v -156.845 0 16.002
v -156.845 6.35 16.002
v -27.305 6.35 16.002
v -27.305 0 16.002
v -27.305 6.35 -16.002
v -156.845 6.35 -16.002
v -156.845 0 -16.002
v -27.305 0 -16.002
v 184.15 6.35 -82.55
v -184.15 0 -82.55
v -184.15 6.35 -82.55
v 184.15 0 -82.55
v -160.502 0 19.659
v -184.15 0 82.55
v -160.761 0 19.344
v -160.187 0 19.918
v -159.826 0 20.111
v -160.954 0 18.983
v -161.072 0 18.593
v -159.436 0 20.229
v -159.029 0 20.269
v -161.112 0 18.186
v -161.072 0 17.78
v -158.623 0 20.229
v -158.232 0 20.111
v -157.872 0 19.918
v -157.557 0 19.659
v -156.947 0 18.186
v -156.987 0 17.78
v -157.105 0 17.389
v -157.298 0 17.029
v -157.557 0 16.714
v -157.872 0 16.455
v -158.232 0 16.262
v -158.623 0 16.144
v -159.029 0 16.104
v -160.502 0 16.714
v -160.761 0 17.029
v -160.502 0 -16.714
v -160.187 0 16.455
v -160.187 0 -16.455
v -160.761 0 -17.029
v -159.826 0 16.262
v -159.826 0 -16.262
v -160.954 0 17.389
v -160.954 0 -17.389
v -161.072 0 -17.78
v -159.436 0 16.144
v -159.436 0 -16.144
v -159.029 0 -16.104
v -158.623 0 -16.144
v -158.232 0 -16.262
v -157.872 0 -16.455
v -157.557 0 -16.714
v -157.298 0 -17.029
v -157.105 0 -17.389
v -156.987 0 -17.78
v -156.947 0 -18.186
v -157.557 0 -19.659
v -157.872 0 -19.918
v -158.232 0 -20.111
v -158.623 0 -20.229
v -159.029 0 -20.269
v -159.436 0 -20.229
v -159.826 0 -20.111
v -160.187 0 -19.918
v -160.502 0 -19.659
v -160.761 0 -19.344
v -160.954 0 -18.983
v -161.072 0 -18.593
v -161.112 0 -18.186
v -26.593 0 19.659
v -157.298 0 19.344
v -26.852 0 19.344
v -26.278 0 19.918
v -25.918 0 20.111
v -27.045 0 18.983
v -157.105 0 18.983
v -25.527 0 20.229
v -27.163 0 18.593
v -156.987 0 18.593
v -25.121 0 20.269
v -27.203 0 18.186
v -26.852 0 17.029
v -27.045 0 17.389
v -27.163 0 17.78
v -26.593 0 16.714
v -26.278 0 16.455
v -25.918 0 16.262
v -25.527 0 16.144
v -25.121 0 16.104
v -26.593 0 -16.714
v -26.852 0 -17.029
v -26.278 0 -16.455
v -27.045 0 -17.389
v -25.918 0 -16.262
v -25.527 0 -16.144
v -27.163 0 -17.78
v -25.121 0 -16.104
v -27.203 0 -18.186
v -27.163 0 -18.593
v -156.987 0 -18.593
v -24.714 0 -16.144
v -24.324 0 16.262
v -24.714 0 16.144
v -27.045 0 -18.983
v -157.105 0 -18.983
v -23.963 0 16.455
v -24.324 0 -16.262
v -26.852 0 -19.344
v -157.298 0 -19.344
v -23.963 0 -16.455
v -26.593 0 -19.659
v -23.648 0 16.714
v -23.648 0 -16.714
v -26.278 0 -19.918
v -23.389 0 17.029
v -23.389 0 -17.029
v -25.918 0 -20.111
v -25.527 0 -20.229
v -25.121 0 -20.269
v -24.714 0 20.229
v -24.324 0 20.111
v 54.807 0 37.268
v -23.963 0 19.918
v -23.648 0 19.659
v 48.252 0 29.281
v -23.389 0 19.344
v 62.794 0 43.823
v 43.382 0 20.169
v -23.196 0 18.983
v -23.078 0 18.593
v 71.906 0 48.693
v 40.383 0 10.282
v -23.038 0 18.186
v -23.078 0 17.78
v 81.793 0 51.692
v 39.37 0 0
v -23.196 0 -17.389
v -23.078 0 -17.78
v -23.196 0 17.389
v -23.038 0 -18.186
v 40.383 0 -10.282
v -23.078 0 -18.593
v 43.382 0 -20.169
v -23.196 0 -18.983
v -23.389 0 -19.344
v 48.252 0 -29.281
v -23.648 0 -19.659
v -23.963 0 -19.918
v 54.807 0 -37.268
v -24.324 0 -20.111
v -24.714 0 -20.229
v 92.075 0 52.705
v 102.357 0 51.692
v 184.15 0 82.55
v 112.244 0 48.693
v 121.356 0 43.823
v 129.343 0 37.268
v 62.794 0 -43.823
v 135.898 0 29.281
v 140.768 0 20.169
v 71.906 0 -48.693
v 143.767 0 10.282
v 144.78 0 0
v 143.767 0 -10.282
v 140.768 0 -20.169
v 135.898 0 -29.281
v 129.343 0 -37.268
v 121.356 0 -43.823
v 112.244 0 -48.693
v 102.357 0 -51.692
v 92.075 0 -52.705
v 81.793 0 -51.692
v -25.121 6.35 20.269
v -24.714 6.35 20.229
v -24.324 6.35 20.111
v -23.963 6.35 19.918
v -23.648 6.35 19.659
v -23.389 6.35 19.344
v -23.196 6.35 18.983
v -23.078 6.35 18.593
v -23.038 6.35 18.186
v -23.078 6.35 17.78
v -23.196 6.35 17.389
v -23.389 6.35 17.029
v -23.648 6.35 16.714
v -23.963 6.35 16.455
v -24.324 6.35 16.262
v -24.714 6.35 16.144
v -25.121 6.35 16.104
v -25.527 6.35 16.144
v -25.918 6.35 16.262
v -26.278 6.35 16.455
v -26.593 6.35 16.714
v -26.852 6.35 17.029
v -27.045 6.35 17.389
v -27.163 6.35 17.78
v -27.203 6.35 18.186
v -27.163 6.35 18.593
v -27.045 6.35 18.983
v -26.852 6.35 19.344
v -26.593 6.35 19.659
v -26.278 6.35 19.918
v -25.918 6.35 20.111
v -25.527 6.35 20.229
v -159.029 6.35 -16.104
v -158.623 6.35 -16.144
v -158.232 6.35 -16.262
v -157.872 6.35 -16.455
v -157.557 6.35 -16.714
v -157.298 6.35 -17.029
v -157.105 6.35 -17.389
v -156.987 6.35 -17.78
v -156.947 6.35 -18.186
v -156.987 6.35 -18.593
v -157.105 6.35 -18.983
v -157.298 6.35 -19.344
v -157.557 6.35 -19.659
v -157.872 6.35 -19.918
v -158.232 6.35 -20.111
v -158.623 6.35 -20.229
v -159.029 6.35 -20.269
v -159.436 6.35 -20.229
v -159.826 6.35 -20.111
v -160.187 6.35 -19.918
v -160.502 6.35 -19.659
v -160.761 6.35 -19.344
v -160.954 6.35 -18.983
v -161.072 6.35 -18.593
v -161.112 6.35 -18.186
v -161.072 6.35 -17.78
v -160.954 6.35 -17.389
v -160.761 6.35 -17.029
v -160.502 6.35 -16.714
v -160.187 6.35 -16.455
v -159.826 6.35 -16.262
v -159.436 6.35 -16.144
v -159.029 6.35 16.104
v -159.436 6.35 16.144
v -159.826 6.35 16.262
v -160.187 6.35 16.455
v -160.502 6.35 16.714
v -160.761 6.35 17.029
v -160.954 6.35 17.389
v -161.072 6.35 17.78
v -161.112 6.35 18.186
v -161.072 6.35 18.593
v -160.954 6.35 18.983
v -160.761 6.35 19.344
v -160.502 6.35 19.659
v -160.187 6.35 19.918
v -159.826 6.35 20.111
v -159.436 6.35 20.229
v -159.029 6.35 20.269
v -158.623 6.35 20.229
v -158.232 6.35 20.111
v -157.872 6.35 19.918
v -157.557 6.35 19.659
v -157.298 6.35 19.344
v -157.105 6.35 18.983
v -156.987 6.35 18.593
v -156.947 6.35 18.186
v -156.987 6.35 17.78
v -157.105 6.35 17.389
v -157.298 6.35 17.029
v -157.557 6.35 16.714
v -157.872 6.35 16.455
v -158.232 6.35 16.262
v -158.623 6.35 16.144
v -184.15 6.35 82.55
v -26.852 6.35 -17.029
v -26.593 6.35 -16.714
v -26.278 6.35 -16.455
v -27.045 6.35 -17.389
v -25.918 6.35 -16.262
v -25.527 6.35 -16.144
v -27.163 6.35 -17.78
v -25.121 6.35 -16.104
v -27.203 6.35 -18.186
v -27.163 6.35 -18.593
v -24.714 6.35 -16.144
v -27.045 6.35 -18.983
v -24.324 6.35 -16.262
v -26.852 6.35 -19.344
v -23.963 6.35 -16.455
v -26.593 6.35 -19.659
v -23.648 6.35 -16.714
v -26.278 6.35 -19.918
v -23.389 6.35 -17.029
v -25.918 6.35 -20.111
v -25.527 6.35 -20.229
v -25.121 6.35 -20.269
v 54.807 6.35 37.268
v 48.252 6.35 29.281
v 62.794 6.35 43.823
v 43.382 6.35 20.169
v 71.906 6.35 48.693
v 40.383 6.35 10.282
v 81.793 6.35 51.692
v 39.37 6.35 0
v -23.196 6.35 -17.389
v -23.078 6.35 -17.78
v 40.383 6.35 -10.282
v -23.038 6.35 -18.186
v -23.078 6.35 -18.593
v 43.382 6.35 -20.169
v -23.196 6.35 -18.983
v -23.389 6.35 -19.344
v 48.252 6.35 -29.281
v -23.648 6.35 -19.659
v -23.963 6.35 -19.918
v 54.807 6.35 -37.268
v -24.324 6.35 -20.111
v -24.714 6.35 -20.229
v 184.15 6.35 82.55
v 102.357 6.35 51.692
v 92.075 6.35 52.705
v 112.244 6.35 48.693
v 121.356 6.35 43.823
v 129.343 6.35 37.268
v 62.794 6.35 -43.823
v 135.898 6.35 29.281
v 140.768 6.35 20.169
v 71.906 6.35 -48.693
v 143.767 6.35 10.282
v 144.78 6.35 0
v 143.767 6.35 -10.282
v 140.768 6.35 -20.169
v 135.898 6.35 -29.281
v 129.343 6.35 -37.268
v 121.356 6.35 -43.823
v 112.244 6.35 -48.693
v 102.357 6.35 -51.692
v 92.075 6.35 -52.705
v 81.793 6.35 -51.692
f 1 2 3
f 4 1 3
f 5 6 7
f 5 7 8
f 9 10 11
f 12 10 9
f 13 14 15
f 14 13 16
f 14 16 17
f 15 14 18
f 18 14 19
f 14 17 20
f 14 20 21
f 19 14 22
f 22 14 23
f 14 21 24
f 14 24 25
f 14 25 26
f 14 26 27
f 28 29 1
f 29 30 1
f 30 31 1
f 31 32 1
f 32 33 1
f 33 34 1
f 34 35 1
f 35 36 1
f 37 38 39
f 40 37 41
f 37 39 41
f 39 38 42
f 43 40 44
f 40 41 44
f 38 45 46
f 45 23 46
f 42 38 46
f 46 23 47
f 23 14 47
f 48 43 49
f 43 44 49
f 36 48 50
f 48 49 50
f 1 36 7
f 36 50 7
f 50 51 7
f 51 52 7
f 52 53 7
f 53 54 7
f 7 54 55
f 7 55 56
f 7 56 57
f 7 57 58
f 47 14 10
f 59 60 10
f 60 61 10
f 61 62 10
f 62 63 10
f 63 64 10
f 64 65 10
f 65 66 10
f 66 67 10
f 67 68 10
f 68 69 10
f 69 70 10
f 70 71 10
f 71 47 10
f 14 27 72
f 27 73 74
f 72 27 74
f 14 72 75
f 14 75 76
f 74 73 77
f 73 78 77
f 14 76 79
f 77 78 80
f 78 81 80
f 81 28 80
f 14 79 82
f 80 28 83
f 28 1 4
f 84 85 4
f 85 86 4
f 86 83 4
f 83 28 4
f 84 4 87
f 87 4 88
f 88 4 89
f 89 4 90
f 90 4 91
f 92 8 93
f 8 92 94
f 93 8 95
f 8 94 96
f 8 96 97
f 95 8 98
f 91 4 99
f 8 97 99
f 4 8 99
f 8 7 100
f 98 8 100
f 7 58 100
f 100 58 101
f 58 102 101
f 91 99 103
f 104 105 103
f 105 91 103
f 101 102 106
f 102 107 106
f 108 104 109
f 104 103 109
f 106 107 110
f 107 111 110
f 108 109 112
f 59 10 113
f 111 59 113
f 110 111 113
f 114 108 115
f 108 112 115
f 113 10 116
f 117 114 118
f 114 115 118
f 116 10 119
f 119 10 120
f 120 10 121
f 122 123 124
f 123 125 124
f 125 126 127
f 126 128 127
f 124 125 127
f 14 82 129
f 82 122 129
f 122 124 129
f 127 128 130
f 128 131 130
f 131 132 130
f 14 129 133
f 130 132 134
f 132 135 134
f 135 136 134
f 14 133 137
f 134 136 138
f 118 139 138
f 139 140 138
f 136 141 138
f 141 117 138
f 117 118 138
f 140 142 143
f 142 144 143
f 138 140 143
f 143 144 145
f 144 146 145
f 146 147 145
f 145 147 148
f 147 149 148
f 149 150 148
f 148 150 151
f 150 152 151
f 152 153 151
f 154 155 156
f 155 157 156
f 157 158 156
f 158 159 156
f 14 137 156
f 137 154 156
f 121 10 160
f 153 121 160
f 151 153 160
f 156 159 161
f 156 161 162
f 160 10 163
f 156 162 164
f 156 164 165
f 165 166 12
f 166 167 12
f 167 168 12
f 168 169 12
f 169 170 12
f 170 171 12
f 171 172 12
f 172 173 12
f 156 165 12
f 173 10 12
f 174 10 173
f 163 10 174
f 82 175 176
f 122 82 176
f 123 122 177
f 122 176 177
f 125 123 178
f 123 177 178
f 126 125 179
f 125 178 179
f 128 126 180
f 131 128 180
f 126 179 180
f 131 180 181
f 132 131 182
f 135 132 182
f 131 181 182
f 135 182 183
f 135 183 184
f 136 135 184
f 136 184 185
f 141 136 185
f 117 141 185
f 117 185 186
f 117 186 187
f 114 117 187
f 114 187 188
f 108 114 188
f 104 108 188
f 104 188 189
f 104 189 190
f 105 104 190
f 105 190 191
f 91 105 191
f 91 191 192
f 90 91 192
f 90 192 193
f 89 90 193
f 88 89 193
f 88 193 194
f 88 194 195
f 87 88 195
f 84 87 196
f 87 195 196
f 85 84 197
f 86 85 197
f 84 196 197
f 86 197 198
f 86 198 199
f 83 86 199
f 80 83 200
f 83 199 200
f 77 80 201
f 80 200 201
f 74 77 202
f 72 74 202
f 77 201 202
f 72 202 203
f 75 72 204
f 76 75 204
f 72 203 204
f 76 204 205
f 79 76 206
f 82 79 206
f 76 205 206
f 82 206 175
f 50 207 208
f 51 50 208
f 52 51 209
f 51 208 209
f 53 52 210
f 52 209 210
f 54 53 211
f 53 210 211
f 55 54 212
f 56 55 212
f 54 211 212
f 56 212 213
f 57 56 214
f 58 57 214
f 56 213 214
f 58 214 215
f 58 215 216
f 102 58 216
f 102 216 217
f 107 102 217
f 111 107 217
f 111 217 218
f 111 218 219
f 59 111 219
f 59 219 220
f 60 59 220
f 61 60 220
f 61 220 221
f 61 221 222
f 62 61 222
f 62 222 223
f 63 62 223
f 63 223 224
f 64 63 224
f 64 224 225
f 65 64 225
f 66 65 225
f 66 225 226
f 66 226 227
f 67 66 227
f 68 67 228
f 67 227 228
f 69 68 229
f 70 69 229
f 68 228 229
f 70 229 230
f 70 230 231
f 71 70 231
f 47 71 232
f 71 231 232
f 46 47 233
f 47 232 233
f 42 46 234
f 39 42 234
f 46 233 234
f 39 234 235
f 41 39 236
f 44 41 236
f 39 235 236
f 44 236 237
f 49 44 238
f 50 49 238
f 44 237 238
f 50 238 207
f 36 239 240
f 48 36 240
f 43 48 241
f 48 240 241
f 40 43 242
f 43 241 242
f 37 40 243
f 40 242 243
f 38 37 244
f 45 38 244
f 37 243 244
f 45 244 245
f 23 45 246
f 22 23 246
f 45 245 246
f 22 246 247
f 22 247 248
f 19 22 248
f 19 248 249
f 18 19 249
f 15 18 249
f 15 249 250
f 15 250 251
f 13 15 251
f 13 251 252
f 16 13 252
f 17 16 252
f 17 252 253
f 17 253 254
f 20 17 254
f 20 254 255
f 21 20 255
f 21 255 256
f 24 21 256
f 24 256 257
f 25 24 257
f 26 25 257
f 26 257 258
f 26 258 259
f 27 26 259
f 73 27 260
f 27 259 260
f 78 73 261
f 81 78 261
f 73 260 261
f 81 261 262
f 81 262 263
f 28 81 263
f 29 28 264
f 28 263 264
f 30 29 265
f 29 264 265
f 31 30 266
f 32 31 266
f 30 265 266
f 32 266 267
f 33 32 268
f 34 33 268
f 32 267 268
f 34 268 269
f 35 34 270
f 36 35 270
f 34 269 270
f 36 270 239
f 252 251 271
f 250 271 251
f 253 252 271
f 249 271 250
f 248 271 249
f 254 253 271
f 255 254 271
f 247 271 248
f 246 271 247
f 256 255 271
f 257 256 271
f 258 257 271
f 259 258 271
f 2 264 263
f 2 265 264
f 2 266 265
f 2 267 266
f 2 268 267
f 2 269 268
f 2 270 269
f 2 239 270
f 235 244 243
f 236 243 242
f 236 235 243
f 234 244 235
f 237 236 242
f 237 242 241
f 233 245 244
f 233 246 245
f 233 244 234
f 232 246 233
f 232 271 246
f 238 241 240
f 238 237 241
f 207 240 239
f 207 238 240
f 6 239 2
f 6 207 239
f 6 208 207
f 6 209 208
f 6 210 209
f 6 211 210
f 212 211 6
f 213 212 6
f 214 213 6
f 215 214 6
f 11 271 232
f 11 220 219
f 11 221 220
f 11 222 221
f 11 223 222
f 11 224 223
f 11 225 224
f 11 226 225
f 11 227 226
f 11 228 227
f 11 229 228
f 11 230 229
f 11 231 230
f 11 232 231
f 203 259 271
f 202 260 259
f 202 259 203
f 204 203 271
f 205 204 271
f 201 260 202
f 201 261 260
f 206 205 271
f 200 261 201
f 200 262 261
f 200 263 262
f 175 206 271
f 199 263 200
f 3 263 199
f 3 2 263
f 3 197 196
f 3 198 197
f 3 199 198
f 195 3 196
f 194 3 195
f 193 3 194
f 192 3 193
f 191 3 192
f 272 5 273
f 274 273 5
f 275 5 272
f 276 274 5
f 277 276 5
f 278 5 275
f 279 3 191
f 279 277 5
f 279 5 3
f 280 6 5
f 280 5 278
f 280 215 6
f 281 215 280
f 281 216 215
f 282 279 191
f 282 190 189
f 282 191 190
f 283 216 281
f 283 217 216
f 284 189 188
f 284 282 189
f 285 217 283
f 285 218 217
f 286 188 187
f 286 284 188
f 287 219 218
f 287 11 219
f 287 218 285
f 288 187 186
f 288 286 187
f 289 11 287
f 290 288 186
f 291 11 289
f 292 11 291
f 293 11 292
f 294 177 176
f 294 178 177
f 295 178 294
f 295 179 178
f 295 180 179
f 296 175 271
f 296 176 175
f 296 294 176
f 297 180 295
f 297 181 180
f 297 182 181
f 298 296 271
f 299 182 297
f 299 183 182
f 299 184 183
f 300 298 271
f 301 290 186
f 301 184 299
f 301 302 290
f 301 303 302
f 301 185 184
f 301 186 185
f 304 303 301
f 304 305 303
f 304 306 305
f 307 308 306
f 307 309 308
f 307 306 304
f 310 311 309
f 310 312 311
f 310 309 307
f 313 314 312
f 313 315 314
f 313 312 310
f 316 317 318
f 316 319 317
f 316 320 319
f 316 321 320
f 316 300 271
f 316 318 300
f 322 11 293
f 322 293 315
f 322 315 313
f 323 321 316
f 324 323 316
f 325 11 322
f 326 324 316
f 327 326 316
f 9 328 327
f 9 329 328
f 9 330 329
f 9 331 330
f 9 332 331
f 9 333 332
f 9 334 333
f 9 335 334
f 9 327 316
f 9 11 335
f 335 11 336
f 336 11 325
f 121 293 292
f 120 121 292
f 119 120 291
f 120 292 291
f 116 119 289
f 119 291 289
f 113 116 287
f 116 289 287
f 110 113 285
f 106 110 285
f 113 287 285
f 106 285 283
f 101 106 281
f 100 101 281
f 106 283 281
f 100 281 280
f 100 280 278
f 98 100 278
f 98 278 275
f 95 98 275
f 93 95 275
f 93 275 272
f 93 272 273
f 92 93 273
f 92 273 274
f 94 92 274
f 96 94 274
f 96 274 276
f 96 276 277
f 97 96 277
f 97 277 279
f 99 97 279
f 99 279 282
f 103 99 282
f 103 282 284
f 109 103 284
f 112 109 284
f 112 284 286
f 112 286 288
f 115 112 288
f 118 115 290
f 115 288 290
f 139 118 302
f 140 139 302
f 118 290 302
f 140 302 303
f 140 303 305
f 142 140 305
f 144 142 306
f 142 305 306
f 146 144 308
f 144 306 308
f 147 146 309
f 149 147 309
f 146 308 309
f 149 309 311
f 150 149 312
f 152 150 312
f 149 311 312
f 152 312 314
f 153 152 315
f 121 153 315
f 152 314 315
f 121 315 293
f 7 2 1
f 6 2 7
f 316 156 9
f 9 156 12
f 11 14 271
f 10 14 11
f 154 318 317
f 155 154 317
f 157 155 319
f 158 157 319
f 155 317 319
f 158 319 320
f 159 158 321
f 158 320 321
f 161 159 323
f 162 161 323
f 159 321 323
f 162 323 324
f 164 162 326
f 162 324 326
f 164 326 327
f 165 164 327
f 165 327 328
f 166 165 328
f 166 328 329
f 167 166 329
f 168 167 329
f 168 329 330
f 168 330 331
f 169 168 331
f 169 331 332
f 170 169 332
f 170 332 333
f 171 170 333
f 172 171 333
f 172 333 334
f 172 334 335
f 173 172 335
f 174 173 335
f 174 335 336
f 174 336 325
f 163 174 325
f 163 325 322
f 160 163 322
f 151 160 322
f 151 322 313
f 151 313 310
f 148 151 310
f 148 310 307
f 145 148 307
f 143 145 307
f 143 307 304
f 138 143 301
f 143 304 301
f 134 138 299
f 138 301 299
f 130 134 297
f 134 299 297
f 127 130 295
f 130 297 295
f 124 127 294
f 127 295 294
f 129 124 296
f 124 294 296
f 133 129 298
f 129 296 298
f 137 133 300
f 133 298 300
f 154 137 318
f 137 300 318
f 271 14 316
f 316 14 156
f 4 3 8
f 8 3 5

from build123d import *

# Parameters (mm, degrees)
SKETCH1_W           = 368.3
SKETCH1_H           = 165.1
BOSS_EXTRUDE1_DEPTH = 6.35
SKETCH2_R           = 52.705
SKETCH2_R_2         = 2.0828
SKETCH2_W           = 129.54
SKETCH2_H           = 32.004
CUT_EXTRUDE1_DEPTH  = 202.906036314


with BuildPart() as part:
    # Sketch1 → Boss-Extrude1 (new body)
    with BuildSketch(Plane(origin=(0, 0, 0), x_dir=(1, 0, 0), z_dir=(0, 1, 0))):
        Rectangle(SKETCH1_W, SKETCH1_H)
    extrude(amount=BOSS_EXTRUDE1_DEPTH)

    # Sketch2 → Cut-Extrude1 (cut, through all)
    with BuildSketch(Plane(origin=(0, 6.35, 0), x_dir=(1, 0, 0), z_dir=(0, 1, 0))):
        with Locations(Location((92.075, 0, 0), (0, 0, 270))):
            Circle(SKETCH2_R)
        with Locations(Location((-159.0294, 18.1864, 0), (0, 0, 270))):
            Circle(SKETCH2_R_2)
        with Locations(Location((-159.0294, -18.1864, 0), (0, 0, 90))):
            Circle(SKETCH2_R_2)
        with Locations(Location((-25.1206, 18.1864, 0), (0, 0, 90))):
            Circle(SKETCH2_R_2)
        with Locations(Location((-25.1206, -18.1864, 0), (0, 0, 270))):
            Circle(SKETCH2_R_2)
        with Locations((-92.075, 0)):
            Rectangle(SKETCH2_W, SKETCH2_H)
    extrude(amount=-CUT_EXTRUDE1_DEPTH, mode=Mode.SUBTRACT)


solid = part.part
